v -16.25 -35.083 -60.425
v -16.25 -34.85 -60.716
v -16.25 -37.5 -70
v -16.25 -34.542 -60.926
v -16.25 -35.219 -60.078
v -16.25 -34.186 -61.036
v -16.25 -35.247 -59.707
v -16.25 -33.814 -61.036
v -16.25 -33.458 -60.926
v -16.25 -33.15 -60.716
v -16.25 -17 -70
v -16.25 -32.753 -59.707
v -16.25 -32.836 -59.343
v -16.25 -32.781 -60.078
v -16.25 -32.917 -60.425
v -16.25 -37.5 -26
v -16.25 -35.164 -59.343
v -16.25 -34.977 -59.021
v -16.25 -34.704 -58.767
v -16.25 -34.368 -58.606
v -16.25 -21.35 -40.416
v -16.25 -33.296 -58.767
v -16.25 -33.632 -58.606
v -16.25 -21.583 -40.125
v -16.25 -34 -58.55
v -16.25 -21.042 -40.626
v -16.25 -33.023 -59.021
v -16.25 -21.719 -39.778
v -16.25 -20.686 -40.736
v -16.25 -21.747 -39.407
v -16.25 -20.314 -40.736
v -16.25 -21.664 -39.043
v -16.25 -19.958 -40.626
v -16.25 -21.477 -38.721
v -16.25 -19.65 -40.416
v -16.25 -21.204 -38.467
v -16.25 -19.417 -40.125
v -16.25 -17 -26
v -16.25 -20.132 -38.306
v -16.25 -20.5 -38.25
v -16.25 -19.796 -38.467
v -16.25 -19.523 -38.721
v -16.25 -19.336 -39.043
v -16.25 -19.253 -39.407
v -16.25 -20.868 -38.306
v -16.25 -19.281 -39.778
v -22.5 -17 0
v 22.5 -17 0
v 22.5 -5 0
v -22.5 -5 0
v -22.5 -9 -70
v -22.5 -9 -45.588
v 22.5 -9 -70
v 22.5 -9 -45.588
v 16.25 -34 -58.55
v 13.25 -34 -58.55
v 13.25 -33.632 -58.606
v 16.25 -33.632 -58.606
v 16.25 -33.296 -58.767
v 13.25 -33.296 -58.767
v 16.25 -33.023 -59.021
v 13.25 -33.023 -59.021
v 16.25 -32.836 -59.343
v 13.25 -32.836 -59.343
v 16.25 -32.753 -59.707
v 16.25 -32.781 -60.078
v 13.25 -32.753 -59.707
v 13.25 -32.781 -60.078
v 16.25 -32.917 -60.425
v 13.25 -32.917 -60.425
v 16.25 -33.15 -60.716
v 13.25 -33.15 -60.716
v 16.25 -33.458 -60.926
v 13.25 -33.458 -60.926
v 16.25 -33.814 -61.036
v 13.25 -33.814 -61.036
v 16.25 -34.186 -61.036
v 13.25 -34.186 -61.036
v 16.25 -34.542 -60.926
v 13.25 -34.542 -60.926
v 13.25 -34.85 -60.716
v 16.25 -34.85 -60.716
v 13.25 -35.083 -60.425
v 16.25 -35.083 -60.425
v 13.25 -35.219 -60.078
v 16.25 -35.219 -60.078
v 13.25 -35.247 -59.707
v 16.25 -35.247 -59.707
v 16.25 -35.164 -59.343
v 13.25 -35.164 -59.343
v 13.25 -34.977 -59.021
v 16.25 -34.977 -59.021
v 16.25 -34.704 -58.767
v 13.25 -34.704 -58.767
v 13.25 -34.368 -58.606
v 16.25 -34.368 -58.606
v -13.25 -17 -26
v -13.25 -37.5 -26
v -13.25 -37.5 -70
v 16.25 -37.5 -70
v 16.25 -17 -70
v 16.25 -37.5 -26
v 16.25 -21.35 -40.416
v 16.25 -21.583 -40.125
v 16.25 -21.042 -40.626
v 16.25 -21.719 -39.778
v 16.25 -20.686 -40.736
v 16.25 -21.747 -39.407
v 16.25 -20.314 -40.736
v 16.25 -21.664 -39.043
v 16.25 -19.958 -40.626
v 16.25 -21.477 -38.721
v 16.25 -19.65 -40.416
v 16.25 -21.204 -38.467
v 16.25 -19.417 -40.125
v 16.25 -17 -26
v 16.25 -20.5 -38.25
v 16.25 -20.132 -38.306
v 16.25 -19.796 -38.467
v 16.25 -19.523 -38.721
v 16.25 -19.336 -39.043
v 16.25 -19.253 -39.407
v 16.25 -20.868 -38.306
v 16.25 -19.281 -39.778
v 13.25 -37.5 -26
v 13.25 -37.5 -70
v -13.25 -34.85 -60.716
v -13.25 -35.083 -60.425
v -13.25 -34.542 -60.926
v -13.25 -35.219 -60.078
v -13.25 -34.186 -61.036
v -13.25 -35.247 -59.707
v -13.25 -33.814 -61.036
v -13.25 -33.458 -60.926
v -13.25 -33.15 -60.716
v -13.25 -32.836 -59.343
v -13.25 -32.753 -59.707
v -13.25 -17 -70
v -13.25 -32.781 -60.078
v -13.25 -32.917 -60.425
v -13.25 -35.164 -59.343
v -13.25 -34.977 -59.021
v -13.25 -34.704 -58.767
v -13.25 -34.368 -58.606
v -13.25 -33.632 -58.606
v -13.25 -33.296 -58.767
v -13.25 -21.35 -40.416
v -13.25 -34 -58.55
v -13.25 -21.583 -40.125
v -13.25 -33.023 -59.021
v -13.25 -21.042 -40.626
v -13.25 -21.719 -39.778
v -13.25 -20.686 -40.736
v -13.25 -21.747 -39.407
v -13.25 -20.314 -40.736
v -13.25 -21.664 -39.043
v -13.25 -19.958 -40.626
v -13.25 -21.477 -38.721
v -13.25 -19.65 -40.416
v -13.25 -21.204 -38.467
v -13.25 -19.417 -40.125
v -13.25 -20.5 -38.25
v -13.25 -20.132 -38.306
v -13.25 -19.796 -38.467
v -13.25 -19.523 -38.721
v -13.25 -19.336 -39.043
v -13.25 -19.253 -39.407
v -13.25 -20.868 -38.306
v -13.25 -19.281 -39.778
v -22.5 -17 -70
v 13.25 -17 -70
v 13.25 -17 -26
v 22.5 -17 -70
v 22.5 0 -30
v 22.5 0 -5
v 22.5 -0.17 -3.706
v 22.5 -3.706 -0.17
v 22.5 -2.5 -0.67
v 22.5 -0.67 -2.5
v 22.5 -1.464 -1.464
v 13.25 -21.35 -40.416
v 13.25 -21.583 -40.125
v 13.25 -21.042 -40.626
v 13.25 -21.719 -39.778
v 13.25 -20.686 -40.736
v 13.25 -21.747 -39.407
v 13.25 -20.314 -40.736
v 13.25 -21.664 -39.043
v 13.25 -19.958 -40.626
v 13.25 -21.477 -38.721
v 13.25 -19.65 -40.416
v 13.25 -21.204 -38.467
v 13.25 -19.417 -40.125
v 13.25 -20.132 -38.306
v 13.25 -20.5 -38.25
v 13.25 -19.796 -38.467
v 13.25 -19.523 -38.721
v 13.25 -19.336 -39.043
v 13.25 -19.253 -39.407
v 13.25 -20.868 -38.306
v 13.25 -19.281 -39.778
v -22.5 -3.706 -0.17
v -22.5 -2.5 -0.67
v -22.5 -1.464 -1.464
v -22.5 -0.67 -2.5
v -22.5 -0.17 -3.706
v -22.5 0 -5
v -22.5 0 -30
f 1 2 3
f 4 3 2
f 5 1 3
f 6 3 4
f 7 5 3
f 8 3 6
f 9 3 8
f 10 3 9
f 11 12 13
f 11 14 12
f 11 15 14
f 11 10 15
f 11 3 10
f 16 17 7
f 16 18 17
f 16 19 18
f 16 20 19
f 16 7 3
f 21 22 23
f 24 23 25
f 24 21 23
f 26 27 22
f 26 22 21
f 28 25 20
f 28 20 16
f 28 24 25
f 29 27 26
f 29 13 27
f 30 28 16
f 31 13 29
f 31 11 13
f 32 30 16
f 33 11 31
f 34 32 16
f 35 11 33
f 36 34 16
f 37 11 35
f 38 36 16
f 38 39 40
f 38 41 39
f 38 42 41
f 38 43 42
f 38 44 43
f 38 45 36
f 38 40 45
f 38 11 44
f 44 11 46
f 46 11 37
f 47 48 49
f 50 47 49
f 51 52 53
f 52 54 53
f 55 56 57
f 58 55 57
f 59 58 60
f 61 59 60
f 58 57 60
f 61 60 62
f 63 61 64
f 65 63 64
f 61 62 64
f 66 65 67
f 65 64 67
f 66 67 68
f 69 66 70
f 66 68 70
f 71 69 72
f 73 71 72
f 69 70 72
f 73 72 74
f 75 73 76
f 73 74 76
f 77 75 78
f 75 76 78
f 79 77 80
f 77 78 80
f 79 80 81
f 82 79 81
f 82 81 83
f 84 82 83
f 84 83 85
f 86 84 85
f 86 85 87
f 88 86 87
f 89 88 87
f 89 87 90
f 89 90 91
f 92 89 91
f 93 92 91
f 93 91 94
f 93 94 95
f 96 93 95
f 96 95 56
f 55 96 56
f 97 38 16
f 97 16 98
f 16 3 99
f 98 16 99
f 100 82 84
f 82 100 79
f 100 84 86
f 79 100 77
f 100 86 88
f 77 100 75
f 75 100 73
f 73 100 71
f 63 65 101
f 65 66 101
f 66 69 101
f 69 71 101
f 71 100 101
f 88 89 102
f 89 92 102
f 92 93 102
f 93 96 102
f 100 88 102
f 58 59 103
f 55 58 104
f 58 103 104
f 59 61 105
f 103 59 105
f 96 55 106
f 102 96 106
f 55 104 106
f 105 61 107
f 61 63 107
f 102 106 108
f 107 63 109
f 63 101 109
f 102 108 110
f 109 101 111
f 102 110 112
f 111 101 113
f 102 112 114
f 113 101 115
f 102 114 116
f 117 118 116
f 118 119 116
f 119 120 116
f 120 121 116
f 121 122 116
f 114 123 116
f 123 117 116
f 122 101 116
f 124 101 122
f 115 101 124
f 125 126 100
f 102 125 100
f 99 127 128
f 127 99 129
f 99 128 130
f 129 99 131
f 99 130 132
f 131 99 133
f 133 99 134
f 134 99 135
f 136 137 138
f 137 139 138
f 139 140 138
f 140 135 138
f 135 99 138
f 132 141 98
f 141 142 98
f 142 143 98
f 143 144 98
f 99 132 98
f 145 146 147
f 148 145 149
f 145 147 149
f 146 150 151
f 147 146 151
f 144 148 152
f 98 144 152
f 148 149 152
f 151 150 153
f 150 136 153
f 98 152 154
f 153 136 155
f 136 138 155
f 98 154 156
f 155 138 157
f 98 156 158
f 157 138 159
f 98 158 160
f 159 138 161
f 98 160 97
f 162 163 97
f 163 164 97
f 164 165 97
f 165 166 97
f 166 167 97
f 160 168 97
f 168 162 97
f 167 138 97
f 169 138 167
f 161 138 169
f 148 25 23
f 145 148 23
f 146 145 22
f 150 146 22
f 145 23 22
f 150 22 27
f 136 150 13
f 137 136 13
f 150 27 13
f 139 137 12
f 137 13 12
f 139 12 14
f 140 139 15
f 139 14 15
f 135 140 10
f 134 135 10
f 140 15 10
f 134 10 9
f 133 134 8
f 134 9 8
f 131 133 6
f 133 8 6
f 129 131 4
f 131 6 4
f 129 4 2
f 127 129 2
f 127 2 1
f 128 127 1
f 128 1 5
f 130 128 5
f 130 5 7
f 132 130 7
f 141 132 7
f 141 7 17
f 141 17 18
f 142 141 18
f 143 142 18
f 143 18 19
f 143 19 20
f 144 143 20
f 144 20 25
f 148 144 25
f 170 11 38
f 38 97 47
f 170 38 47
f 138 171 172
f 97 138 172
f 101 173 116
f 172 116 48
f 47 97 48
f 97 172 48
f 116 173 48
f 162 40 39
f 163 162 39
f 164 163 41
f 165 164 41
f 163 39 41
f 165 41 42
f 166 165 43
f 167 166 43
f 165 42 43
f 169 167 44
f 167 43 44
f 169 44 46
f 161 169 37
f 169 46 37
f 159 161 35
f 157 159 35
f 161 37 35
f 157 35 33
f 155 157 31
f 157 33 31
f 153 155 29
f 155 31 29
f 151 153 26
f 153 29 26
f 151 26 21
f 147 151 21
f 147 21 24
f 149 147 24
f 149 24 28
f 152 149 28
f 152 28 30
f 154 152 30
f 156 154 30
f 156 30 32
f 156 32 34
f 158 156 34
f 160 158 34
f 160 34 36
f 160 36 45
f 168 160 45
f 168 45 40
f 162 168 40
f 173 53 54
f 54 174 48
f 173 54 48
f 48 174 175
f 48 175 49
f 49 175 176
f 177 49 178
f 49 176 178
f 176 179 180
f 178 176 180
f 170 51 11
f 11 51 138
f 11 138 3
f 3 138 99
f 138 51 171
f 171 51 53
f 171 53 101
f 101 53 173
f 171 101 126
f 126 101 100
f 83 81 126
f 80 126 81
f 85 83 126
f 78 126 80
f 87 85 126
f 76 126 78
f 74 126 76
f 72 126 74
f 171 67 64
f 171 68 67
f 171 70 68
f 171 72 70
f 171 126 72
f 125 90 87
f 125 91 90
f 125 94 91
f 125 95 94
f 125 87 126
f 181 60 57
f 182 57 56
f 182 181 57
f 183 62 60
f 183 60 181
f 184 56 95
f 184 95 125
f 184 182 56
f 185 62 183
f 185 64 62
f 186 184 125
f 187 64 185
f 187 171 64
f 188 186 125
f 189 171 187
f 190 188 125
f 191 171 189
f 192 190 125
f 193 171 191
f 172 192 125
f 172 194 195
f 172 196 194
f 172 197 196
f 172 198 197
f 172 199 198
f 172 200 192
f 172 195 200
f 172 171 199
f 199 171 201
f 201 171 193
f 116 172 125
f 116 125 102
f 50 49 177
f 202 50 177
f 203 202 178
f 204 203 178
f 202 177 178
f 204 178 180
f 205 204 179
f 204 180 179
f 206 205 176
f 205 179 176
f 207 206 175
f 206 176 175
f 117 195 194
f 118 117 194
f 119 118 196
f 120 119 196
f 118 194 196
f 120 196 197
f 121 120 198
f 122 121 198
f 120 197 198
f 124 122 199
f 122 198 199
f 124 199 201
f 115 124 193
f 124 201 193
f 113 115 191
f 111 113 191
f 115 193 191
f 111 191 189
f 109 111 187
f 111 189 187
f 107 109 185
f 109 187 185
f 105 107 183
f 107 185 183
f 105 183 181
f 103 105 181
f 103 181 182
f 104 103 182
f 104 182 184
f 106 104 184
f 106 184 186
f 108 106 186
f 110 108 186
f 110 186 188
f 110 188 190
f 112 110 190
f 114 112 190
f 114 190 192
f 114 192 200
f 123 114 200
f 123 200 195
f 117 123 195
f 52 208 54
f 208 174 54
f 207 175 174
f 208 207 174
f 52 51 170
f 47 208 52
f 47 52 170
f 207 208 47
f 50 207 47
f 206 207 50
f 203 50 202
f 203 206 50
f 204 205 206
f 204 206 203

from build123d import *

# Parameters (mm, degrees)
BOSS_EXTRUDE1_DEPTH = 22.5
SKETCH2_W           = 3
SKETCH2_H           = 44
BOSS_EXTRUDE2_DEPTH = 20.5
SKETCH3_R           = 1.25
CUT_EXTRUDE1_DEPTH  = 39.75


with BuildPart() as part:
    # Sketch1 → Boss-Extrude1 (new body, symmetric)
    with BuildSketch(Plane(origin=(0, 0, 0), x_dir=(0, 0, -1), z_dir=(1, 0, 0))):
        with BuildLine():
            Line((5, 0), (30, 0))
            Line((30, 0), (45.588457268, -9))
            Line((45.588457268, -9), (70, -9))
            Line((70, -9), (70, -17))
            Line((70, -17), (63.318457268, -17))
            Line((63.318457268, -17), (0, -17))
            Line((0, -17), (0, -5))
            ThreePointArc((0, -5), (1.464466094, -1.464466094), (5, 0))
        make_face()
    extrude(amount=BOSS_EXTRUDE1_DEPTH, both=True)

    # Sketch2 → Boss-Extrude2 (add)
    with BuildSketch(Plane.XZ.offset(17)):
        with Locations((14.75, -48)):
            Rectangle(SKETCH2_W, SKETCH2_H)
        with Locations((-14.75, -48)):
            Rectangle(SKETCH2_W, SKETCH2_H)
    extrude(amount=BOSS_EXTRUDE2_DEPTH)

    # Sketch3 → Cut-Extrude1 (cut, through all)
    with BuildSketch(Plane.ZY.offset(16.25)):
        with Locations((-59.8, -34)):
            Circle(SKETCH3_R)
        with Locations((-39.5, -20.5)):
            Circle(SKETCH3_R)
    extrude(amount=-CUT_EXTRUDE1_DEPTH, mode=Mode.SUBTRACT)


solid = part.part
